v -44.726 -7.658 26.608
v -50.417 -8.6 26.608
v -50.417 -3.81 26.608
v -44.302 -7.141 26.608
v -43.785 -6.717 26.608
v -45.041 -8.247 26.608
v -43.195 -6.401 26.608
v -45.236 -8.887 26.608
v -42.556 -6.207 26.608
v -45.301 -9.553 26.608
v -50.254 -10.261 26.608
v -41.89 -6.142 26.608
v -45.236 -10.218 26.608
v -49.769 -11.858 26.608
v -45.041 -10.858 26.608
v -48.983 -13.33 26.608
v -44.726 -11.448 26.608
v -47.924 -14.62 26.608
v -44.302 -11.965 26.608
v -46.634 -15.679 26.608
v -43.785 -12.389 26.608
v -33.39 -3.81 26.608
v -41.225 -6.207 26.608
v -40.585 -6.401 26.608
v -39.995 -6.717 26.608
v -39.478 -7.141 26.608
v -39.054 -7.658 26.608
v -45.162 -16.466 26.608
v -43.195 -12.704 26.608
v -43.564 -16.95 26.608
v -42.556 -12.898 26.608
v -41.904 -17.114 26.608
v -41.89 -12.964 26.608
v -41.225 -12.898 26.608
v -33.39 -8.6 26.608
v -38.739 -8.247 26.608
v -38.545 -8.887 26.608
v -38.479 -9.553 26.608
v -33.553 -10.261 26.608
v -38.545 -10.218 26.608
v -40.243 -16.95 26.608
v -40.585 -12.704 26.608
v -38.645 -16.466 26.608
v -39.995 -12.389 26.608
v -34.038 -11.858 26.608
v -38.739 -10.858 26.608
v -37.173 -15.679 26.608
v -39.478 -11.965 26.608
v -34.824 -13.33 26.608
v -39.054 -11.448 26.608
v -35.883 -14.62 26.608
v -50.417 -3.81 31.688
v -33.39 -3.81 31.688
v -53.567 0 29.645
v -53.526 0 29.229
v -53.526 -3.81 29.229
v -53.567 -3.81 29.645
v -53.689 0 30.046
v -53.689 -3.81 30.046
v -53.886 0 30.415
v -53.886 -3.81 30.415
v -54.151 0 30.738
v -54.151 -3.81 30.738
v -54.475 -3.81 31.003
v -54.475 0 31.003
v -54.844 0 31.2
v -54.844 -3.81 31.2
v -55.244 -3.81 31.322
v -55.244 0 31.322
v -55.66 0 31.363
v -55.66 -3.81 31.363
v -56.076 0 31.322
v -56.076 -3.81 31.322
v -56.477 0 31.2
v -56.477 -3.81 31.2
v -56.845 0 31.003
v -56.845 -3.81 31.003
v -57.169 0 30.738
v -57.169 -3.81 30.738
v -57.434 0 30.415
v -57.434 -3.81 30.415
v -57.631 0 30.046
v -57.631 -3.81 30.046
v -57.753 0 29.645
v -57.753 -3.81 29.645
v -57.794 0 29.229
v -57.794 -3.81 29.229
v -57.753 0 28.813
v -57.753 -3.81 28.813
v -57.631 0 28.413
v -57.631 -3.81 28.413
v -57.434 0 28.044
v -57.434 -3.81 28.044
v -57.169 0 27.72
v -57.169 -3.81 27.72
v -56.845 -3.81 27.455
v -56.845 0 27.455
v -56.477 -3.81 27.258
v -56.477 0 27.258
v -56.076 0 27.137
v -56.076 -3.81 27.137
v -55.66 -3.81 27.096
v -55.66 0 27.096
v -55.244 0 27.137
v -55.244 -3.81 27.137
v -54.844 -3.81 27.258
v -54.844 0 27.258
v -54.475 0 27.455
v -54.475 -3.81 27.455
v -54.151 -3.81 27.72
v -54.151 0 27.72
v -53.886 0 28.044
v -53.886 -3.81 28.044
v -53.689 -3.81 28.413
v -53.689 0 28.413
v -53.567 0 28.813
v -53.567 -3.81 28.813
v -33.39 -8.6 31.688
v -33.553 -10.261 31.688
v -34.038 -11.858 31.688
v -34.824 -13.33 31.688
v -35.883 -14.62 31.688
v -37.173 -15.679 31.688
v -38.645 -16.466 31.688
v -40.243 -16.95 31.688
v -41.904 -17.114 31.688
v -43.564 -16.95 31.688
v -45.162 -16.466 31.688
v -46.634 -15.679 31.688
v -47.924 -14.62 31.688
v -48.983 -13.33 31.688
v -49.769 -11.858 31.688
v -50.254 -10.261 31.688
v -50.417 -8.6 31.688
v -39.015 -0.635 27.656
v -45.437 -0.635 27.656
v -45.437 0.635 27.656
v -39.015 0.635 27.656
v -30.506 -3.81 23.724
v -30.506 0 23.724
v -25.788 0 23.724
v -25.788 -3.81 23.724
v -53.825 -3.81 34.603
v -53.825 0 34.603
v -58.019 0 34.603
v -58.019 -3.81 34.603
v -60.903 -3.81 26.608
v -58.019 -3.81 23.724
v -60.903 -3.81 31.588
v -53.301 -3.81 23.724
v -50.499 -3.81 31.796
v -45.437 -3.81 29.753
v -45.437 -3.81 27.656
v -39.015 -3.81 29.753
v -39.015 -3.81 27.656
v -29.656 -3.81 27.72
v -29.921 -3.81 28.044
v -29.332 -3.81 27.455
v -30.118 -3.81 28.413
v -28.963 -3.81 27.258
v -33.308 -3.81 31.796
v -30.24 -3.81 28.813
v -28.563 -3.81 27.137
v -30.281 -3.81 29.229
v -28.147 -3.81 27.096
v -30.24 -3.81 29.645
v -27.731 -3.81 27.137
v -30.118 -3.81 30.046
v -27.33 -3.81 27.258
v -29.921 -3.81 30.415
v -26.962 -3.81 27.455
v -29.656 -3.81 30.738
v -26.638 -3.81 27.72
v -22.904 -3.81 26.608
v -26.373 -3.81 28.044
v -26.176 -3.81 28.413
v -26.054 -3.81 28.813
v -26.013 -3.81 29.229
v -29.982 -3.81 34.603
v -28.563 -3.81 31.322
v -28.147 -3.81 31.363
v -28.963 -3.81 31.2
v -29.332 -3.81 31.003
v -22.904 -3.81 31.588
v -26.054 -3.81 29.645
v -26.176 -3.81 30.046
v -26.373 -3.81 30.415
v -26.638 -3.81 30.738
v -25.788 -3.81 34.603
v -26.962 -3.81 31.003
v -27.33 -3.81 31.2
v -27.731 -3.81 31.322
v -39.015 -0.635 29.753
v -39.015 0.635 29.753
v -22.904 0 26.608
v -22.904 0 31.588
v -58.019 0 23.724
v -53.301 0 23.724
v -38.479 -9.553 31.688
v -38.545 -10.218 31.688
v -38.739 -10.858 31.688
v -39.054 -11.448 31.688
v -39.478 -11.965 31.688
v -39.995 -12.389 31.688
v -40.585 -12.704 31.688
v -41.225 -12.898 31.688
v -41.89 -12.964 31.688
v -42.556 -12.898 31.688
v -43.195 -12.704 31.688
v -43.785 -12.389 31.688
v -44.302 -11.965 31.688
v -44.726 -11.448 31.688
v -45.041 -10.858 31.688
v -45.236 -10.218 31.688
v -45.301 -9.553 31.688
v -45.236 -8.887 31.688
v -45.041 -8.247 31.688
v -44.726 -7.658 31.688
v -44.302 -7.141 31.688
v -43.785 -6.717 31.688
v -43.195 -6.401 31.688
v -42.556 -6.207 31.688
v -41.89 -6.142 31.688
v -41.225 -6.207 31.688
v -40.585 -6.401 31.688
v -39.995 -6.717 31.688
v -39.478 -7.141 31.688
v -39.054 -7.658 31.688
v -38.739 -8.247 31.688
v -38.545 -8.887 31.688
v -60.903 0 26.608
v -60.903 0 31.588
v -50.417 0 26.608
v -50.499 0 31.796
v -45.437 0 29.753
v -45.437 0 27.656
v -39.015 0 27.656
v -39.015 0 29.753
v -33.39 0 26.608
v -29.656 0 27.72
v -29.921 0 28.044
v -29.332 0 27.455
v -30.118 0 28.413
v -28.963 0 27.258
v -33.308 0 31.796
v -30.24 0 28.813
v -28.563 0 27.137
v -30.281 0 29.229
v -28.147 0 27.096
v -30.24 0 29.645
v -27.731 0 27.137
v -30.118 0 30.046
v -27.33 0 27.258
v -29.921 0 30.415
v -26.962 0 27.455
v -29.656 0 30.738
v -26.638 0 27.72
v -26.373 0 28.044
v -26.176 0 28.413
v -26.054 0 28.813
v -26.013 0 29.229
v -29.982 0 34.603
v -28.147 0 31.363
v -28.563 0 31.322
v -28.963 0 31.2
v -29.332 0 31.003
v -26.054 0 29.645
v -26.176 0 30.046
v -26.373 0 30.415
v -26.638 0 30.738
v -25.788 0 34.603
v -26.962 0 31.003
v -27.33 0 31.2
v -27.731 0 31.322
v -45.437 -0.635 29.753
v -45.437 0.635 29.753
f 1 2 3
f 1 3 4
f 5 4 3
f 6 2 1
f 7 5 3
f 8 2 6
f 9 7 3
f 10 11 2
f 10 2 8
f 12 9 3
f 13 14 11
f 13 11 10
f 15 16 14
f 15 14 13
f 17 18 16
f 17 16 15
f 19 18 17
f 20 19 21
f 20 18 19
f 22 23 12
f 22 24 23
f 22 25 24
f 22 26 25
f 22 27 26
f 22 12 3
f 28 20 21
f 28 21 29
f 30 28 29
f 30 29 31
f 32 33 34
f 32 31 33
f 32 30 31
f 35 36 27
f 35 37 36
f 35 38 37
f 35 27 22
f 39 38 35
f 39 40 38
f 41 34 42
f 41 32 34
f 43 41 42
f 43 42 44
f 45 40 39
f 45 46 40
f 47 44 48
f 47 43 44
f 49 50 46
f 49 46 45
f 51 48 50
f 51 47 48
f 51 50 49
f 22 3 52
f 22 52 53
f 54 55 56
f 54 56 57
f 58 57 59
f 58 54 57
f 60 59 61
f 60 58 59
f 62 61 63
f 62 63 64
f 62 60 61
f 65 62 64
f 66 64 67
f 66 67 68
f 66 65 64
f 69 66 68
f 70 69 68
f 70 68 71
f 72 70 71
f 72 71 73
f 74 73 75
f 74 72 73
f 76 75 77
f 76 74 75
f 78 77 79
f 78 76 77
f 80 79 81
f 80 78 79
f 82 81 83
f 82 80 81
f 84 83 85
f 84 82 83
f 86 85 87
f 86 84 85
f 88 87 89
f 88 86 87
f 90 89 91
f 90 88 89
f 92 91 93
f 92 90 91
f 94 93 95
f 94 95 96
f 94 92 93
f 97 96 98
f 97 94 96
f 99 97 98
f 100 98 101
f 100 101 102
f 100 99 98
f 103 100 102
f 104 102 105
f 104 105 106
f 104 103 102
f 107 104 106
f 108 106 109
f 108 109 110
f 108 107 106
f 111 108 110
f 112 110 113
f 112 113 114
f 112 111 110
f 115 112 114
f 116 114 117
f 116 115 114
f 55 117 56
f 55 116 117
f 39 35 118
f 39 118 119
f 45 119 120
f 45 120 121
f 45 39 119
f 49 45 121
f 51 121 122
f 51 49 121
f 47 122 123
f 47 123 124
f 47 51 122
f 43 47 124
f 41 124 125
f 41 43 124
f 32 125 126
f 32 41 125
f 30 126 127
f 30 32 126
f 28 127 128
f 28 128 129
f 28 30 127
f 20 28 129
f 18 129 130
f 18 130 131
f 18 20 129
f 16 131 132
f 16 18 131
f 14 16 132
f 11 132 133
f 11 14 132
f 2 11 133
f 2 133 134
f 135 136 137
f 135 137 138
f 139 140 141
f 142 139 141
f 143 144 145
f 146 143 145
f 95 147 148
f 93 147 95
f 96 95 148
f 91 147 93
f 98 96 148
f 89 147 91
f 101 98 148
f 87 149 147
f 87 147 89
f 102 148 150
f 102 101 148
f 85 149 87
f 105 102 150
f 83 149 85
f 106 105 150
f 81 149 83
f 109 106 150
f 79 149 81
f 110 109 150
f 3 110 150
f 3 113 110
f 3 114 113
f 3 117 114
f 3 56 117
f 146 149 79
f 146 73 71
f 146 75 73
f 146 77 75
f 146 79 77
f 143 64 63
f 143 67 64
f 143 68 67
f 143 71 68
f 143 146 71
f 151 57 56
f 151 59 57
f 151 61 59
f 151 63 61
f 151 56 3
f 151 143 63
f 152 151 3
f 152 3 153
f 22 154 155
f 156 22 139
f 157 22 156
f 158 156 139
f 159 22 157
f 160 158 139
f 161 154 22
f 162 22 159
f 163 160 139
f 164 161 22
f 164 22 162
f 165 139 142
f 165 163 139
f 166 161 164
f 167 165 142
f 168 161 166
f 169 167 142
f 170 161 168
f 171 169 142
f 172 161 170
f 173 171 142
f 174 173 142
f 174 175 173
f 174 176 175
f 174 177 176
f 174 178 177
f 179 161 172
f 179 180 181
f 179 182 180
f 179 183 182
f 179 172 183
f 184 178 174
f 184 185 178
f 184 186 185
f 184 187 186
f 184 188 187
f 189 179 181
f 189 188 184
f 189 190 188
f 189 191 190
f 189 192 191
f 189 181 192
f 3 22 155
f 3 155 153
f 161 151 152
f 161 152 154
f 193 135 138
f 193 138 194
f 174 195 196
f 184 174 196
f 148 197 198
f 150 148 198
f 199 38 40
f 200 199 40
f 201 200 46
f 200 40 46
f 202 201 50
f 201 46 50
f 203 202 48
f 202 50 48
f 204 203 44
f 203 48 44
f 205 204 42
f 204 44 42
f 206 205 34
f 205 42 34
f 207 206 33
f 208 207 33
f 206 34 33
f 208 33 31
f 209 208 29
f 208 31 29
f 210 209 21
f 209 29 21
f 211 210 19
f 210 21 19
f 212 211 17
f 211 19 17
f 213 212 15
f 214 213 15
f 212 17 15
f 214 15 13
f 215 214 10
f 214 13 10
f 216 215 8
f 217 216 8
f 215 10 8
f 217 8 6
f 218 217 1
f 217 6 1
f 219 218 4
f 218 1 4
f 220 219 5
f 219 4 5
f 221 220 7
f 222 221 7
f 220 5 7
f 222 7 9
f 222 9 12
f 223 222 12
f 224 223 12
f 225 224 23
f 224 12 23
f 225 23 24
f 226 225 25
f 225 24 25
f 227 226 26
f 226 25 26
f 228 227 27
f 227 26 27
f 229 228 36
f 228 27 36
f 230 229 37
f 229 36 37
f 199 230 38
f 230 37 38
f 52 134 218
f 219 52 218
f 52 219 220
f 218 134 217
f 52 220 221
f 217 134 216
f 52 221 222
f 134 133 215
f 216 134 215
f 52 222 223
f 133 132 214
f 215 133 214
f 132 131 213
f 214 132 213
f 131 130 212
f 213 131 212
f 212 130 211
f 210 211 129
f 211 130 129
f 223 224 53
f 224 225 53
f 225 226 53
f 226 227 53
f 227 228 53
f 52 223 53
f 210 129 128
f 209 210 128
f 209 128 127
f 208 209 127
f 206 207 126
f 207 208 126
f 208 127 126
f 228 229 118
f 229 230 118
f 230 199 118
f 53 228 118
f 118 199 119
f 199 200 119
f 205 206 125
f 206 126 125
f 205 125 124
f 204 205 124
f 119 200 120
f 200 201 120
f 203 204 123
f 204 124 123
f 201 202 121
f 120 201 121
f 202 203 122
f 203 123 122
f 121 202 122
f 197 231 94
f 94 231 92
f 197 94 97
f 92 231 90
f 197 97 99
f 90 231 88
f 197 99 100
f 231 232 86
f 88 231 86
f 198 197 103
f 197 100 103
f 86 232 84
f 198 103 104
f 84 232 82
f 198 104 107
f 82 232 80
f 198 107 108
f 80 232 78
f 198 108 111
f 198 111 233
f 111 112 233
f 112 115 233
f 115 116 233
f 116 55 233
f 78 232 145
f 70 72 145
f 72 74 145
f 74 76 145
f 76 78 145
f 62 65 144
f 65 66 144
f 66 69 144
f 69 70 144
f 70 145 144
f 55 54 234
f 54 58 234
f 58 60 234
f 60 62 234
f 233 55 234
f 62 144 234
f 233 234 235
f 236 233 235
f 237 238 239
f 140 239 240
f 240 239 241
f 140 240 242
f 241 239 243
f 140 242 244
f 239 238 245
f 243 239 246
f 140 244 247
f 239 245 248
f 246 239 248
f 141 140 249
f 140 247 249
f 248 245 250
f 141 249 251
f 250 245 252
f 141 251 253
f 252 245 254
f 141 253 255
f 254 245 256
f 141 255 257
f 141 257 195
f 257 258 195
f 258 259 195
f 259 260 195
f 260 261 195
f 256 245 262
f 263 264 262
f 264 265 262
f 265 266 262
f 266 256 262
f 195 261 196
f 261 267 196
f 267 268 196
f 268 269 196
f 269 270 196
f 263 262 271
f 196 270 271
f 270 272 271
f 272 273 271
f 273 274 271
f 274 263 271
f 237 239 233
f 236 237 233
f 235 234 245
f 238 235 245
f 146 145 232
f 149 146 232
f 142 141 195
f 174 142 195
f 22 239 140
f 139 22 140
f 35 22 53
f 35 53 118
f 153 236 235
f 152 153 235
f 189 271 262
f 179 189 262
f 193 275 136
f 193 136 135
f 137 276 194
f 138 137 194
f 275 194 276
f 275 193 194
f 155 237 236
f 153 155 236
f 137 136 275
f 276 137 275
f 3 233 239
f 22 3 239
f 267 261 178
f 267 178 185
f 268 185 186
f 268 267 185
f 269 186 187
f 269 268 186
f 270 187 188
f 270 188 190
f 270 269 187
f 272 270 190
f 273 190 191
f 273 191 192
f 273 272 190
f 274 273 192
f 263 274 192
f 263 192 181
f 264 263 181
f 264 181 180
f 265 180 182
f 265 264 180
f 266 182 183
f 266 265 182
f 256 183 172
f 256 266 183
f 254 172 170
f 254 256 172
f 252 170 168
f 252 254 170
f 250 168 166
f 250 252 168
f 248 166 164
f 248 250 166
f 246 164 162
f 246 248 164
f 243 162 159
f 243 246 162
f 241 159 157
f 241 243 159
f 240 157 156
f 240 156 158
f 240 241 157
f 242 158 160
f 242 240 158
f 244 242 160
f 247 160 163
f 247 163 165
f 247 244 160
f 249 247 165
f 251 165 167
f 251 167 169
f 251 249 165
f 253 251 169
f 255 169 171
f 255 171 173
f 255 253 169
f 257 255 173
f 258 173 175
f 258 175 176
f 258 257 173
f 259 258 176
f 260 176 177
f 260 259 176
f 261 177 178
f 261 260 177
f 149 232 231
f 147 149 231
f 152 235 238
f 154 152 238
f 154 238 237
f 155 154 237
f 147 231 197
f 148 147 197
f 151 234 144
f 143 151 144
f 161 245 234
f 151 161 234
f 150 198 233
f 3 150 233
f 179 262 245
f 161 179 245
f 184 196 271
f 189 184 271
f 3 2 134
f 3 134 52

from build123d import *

# Parameters (mm, degrees)
F0_R     = 2.133606
F1_DEPTH = 3.81
F0_W     = 2.888897
F0_H     = 2.097062
F0_W_2   = 3.533358
F2_DEPTH = 0.635
F3_R     = 3.411002
F4_DEPTH = 5.08


with BuildPart() as f1:
    # F0 (on Front) → F1 (new body)
    with BuildSketch(Plane.XZ):
        Polygon((-41.903517, 31.796391), (-50.499284, 31.796391), (-53.825128, 34.60286), (-58.019256, 34.60286), (-60.902717, 31.58833), (-60.902717, 26.607805), (-58.019256, 23.724342), (-53.30086, 23.724342), (-50.4174, 26.607805), (-41.903517, 26.607805), (-41.903517, 27.656337), (-45.436875, 27.656337), (-45.436875, 29.753399), (-41.903517, 29.753399), align=None)
        with Locations((-55.660058, 29.229134)):
            Circle(F0_R, mode=Mode.SUBTRACT)
        Polygon((-33.307749, 31.796391), (-41.903517, 31.796391), (-41.903517, 29.753399), (-39.01462, 29.753399), (-39.01462, 27.656337), (-41.903517, 27.656337), (-41.903517, 26.607805), (-33.389634, 26.607805), (-30.506173, 23.724342), (-25.787777, 23.724342), (-22.904317, 26.607805), (-22.904317, 31.58833), (-25.787777, 34.60286), (-29.981906, 34.60286), align=None)
        with Locations((-28.146975, 29.229134)):
            Circle(F0_R, mode=Mode.SUBTRACT)
    extrude(amount=F1_DEPTH)


with BuildPart() as f2:
    # F0 (on Front) → F2 (new body, symmetric)
    with BuildSketch(Plane.XZ):
        with Locations((-40.459069, 28.704868)):
            Rectangle(F0_W, F0_H)
        with Locations((-43.670196, 28.704868)):
            Rectangle(F0_W_2, F0_H)
    extrude(amount=F2_DEPTH, both=True)


with BuildPart() as f4:
    # F3 (on face) → F4 (new body)
    with BuildSketch(Plane(origin=(0, 0, 26.607805), x_dir=(1, 0, 0), z_dir=(0, 0, -1))):
        with BuildLine():
            Line((-50.4174, 8.599777), (-50.4174, 3.81))
            Line((-50.4174, 3.81), (-46.59472, 3.81))
            Line((-46.59472, 3.81), (-36.627345, 3.81))
            Line((-36.627345, 3.81), (-33.389634, 3.81))
            Line((-33.389634, 3.81), (-33.389634, 8.599777))
            ThreePointArc((-33.389634, 8.599777), (-41.903517, 17.11366), (-50.4174, 8.599777))
        make_face()
        with Locations((-41.890103, 9.552663)):
            Circle(F3_R, mode=Mode.SUBTRACT)
    extrude(amount=-F4_DEPTH)


solid = Compound([f1.part, f2.part, f4.part])
